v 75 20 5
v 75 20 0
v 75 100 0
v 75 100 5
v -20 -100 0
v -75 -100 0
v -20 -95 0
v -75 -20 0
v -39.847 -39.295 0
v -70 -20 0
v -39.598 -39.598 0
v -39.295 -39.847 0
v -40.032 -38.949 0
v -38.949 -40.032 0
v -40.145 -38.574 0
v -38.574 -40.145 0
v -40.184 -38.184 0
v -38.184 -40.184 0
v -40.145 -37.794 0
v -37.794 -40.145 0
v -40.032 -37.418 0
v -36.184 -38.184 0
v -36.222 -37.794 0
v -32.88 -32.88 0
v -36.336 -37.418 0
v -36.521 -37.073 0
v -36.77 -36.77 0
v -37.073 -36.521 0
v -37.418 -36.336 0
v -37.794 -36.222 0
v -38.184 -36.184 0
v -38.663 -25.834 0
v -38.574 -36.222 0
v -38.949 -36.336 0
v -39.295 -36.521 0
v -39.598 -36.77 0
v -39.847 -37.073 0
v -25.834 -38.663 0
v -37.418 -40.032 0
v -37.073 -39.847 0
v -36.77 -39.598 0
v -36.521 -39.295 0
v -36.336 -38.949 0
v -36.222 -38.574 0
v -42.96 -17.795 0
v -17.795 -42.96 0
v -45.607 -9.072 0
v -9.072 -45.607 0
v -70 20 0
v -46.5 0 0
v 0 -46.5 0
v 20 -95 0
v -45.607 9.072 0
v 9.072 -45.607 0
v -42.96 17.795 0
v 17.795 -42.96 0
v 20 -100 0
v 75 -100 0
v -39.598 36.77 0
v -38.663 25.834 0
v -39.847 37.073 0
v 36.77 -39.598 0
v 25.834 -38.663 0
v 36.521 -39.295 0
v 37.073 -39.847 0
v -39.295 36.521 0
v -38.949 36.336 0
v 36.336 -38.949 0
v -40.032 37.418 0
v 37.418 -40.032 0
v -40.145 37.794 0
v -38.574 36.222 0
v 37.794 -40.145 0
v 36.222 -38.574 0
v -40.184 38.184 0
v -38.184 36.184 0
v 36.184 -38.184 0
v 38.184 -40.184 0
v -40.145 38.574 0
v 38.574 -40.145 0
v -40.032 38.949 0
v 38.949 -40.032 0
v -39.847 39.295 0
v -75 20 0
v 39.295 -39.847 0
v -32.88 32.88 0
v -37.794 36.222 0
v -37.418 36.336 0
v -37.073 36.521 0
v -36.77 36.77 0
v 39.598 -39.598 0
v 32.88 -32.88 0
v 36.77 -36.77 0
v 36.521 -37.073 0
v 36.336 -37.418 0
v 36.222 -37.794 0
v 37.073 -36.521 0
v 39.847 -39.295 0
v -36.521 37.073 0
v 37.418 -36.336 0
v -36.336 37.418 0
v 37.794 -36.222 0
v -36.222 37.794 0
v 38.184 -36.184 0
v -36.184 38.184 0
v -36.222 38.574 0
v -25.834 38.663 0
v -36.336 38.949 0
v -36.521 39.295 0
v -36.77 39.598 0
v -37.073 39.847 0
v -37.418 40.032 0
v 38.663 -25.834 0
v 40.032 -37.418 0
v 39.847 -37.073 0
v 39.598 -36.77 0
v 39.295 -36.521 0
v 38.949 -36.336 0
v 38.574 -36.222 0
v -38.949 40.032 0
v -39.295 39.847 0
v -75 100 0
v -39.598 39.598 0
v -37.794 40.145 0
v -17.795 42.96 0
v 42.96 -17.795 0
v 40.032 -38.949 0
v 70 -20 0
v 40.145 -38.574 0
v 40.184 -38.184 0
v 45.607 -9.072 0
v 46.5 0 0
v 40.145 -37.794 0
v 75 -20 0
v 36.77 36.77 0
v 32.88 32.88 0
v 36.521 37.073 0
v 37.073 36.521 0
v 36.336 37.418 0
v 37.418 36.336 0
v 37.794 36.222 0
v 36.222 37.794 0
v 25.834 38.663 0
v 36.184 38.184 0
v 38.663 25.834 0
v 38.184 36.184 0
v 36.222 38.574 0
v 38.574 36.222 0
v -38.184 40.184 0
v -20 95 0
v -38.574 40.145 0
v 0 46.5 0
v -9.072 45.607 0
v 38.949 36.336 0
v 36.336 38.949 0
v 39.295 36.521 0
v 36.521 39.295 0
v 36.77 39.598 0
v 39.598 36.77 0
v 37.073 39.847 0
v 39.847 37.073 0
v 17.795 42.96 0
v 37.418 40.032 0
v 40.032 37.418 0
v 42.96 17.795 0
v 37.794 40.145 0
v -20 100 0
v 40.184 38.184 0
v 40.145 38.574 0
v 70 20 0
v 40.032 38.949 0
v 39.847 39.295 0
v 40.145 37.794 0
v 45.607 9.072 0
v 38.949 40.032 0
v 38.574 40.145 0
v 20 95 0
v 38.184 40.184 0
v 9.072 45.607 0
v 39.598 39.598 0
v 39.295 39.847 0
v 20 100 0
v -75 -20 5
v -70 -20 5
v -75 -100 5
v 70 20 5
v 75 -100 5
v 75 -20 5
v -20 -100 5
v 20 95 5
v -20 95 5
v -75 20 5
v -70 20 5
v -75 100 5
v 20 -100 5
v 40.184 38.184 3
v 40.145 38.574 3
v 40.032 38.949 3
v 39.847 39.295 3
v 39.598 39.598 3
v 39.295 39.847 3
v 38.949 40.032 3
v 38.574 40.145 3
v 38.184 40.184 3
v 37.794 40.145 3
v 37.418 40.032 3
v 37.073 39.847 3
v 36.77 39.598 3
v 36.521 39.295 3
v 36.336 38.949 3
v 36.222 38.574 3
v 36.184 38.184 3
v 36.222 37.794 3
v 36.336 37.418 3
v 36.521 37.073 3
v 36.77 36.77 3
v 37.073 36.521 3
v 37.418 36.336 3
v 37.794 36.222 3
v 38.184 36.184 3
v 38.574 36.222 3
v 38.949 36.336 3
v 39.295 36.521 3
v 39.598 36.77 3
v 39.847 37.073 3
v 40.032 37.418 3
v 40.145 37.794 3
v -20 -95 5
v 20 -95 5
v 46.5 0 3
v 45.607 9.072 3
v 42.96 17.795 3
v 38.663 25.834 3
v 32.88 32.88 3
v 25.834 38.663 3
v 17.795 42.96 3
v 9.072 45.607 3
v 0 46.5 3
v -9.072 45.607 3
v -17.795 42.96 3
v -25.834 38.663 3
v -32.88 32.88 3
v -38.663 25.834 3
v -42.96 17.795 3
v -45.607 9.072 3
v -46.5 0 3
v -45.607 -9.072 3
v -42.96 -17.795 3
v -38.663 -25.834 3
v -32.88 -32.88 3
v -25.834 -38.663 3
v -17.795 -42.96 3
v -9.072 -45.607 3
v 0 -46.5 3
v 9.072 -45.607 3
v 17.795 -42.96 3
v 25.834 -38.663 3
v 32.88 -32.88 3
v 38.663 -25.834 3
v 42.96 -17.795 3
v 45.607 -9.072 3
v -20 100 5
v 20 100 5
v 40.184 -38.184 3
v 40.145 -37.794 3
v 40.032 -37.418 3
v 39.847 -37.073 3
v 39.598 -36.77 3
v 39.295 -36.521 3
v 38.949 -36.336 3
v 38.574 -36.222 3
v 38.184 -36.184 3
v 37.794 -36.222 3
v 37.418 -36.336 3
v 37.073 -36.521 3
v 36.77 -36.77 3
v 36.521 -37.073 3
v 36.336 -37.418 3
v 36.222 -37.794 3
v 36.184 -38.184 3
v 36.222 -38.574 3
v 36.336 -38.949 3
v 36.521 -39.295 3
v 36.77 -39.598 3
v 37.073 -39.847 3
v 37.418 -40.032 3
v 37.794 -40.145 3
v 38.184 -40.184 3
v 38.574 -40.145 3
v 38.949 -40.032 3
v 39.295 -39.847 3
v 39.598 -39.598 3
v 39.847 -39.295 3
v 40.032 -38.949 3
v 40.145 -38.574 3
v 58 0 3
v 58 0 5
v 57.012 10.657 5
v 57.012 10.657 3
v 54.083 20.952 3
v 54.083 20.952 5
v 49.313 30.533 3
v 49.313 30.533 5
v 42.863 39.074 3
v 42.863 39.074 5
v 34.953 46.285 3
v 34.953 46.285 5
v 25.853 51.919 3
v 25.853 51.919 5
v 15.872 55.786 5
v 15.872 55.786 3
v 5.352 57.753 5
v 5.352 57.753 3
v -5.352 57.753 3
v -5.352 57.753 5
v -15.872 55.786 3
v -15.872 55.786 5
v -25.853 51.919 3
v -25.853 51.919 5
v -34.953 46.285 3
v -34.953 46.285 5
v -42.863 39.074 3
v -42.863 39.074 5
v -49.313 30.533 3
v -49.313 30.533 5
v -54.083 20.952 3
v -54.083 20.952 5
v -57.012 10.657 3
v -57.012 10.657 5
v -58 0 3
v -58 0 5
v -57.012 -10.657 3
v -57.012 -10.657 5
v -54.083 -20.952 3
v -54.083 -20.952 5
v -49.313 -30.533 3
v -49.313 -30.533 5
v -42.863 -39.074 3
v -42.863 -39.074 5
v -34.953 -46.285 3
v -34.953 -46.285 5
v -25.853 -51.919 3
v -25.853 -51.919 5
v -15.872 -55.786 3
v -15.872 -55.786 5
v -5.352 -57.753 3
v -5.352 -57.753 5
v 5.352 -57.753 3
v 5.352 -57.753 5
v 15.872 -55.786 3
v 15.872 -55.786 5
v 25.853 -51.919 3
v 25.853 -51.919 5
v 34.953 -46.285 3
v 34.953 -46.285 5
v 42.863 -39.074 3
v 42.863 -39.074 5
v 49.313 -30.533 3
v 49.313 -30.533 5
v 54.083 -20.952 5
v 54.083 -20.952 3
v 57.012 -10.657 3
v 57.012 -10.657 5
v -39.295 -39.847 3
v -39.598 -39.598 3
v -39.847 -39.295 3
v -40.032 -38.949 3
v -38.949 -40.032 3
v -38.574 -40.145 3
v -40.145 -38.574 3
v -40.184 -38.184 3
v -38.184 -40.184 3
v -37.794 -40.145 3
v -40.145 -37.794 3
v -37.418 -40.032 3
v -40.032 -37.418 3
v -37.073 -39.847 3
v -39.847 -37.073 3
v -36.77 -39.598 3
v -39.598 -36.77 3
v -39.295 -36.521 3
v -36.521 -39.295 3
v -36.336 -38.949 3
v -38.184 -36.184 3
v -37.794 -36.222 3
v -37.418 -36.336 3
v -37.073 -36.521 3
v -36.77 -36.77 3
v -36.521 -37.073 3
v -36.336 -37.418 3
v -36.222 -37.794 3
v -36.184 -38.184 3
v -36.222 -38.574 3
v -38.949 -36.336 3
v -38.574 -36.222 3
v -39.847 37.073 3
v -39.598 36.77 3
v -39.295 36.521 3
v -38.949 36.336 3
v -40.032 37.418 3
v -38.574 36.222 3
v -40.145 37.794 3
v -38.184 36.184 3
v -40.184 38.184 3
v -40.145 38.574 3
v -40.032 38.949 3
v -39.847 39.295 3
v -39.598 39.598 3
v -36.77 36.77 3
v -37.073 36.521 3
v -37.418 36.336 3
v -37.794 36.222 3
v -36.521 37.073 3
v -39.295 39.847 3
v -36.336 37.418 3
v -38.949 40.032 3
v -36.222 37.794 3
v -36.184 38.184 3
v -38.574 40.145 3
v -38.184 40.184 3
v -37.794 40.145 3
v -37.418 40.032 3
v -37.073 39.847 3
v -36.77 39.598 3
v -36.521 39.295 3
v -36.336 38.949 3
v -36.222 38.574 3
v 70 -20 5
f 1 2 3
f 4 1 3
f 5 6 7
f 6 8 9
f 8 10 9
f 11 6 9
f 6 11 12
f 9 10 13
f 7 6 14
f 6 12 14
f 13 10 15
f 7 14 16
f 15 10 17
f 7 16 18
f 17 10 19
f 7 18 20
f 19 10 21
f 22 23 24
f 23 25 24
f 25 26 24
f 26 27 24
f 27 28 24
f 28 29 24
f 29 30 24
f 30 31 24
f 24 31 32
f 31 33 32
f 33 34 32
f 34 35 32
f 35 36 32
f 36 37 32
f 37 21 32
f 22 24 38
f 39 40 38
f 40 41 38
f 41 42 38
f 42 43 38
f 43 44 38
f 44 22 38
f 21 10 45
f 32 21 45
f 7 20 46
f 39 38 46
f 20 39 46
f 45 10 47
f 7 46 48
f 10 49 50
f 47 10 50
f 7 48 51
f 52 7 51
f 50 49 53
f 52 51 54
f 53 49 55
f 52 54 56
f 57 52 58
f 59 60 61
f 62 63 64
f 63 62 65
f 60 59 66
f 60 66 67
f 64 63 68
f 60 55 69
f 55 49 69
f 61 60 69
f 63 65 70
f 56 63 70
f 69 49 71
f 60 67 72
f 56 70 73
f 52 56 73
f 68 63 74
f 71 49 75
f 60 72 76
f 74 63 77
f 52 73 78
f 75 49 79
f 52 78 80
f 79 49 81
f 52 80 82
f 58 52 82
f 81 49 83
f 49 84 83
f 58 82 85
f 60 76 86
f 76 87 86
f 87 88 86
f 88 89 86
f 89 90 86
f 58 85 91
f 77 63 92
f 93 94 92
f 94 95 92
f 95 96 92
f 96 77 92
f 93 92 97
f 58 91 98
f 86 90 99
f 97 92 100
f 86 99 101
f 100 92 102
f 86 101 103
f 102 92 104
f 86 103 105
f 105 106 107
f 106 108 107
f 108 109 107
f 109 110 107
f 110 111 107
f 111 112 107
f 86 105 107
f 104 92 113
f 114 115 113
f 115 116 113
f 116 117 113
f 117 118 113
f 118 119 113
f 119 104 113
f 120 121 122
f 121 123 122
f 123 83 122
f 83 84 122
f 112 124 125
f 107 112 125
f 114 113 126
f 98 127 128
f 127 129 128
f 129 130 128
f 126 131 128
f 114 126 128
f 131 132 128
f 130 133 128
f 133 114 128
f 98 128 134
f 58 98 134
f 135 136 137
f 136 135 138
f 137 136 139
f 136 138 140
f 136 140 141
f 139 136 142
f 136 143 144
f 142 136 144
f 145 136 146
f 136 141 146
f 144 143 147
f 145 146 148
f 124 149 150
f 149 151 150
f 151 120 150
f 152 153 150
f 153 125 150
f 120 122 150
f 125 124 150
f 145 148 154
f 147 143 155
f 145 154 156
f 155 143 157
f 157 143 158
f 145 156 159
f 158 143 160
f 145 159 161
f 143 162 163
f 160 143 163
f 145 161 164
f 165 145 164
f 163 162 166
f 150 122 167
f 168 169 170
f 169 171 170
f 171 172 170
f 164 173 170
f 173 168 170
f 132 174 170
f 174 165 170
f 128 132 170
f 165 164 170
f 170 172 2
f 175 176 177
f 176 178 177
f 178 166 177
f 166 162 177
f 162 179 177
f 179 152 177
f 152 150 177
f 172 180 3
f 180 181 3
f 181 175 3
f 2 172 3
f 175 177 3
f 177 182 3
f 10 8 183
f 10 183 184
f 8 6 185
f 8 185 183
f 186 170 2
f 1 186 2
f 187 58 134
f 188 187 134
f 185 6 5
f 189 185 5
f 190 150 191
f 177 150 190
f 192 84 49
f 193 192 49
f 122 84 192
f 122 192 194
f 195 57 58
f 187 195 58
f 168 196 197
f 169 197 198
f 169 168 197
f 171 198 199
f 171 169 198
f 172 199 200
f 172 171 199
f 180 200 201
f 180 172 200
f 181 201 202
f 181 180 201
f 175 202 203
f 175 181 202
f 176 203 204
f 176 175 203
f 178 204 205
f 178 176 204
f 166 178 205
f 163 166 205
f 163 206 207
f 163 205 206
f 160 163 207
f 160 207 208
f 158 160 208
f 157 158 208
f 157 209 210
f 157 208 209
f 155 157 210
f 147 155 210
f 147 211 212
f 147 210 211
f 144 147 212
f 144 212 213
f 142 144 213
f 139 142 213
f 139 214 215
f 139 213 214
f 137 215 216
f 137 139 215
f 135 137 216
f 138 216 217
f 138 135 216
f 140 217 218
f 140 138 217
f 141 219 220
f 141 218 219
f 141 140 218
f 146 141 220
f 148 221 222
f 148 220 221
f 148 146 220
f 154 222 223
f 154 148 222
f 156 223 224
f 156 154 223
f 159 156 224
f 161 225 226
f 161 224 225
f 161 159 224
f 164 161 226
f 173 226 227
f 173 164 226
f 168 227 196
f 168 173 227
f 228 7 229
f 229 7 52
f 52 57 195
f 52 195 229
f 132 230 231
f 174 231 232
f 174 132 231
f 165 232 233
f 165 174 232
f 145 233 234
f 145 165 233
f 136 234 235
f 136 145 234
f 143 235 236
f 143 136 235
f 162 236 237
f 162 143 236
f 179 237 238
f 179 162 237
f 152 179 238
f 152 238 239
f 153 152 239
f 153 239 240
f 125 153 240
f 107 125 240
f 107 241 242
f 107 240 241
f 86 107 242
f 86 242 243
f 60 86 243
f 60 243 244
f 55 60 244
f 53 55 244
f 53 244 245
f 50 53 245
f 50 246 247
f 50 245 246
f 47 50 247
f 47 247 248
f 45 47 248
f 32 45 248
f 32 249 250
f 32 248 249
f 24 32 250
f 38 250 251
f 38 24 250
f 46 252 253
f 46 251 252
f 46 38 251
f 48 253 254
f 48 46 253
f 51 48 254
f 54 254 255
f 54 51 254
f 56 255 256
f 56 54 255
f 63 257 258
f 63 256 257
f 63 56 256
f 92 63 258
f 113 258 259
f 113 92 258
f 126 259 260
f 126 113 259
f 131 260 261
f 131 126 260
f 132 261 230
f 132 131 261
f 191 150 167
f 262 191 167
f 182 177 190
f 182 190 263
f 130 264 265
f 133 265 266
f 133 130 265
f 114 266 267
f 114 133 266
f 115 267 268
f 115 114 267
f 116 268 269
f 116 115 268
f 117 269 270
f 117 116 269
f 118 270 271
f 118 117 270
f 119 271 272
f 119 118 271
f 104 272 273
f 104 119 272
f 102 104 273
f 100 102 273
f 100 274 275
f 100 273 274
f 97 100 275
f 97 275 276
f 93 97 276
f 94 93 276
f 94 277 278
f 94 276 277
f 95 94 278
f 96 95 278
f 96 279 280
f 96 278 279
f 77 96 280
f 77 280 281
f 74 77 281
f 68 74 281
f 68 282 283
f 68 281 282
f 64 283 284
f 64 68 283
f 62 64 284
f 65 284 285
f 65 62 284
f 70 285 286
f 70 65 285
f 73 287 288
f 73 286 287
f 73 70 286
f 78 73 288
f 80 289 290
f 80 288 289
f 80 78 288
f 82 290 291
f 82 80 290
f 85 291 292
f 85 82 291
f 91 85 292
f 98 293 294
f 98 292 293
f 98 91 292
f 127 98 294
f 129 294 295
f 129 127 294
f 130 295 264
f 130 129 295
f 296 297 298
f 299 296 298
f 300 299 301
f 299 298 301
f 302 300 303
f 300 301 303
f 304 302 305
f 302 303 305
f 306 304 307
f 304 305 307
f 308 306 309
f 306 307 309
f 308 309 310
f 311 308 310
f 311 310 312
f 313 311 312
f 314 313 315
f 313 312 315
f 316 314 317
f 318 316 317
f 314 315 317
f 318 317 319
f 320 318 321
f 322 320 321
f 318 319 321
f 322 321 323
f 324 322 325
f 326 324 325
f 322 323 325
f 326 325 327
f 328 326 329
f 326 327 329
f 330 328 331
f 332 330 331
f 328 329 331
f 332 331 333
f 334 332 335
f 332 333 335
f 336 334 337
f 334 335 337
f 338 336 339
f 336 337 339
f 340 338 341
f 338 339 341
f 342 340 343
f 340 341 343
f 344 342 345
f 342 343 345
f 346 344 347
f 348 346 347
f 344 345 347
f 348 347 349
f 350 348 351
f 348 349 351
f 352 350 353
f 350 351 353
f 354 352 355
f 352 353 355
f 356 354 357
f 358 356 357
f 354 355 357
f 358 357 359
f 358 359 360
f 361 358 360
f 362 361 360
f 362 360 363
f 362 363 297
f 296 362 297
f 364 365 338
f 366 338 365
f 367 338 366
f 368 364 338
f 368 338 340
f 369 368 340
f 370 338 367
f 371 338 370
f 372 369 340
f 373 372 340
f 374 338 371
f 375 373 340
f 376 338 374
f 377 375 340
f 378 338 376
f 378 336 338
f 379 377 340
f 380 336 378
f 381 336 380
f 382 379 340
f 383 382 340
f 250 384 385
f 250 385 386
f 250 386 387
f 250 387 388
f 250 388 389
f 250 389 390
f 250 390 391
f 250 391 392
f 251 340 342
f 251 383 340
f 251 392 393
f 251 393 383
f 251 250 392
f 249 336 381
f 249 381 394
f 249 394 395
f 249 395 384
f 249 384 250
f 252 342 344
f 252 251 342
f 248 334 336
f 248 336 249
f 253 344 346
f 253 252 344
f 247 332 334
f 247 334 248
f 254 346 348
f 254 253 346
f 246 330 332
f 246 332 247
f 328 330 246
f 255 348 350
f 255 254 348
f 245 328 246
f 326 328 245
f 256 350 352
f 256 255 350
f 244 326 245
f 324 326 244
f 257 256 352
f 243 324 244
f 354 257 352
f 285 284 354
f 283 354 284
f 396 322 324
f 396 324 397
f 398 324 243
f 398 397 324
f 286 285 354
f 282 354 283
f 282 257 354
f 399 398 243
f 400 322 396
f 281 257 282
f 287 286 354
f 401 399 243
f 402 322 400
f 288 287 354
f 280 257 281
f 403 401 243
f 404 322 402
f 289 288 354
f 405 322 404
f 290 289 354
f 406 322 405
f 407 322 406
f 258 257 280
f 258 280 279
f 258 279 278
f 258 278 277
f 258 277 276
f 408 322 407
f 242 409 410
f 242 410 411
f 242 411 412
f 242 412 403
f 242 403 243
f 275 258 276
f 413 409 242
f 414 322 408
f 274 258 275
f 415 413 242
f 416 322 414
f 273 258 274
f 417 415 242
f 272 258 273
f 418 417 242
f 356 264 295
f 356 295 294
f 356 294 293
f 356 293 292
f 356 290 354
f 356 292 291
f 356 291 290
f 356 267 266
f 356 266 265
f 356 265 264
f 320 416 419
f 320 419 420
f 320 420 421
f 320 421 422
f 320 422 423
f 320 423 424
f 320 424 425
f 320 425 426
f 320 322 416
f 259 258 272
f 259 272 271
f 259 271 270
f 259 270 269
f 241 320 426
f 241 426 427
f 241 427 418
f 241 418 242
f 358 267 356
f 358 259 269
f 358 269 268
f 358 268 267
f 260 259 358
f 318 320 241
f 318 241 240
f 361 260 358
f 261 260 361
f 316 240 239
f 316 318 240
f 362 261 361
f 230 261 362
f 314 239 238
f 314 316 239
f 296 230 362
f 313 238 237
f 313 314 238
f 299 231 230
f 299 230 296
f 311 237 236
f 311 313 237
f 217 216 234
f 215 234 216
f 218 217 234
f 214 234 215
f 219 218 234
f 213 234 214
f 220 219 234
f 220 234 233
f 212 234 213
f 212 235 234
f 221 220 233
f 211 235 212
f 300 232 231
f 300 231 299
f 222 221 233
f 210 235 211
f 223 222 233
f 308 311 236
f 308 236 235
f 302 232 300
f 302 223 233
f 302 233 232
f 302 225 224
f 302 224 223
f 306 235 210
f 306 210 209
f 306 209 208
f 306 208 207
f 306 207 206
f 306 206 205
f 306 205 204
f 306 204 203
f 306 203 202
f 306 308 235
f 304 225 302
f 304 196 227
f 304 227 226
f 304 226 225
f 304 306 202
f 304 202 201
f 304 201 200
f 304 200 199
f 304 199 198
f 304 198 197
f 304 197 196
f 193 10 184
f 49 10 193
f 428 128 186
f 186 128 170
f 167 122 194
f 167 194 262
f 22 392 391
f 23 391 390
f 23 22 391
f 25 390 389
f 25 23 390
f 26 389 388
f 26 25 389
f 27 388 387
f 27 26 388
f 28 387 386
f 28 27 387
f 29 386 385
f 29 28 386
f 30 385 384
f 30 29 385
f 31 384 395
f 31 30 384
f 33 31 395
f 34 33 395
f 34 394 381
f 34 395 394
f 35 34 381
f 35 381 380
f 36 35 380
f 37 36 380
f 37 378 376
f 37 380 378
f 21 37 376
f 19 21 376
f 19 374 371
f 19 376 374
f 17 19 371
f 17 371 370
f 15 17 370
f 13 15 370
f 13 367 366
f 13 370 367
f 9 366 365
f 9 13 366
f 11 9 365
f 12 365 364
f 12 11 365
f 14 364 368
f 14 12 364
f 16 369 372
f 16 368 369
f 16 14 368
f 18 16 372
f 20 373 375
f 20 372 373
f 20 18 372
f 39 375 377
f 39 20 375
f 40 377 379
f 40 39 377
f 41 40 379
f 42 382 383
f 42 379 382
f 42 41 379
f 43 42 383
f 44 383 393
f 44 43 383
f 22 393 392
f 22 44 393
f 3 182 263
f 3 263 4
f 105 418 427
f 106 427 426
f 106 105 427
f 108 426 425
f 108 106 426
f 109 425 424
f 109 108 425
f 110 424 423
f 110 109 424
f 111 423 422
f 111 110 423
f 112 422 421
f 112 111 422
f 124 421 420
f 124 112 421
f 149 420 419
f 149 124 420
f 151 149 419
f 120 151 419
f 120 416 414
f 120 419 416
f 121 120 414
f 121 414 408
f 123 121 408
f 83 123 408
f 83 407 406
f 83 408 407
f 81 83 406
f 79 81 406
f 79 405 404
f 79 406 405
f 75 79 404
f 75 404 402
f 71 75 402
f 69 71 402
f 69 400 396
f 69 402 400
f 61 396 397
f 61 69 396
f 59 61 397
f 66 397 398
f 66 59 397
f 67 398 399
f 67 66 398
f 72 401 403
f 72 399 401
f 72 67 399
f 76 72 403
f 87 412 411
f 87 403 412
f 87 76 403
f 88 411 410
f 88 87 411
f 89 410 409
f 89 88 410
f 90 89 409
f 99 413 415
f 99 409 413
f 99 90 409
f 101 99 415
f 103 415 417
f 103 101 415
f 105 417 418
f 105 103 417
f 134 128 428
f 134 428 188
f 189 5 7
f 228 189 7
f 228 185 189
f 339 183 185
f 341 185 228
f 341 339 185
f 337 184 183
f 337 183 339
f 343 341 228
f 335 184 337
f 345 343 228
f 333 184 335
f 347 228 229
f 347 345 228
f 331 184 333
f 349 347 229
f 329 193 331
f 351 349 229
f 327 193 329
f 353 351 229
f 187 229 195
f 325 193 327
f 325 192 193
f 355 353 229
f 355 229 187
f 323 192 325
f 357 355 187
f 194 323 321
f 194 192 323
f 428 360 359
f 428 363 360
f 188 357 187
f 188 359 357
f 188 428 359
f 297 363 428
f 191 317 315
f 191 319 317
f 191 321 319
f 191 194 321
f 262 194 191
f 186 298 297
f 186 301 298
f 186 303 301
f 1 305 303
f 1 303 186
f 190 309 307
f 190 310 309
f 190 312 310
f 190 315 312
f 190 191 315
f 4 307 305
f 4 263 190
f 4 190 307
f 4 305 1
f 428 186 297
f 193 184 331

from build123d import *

# Parameters (mm, degrees)
CROQUIS1_W              = 150
CROQUIS1_H              = 200
CROQUIS1_R              = 46.5
CROQUIS1_R_2            = 2
SALIENTE_EXTRUIR1_DEPTH = 5
CROQUIS2_R              = 58
CORTAR_EXTRUIR1_DEPTH   = 2
CORTAR_EXTRUIR2_START   = -5
CROQUIS3_W              = 40
CROQUIS3_H              = 5
CROQUIS3_W_2            = 5
CROQUIS3_H_2            = 40
CORTAR_EXTRUIR2_DEPTH   = 5


with BuildPart() as part:
    # Croquis1 → Saliente-Extruir1 (new body)
    with BuildSketch(Plane.XY):
        Rectangle(CROQUIS1_W, CROQUIS1_H)
        Circle(CROQUIS1_R, mode=Mode.SUBTRACT)
        with Locations((-38.183766184, 38.183766184)):
            Circle(CROQUIS1_R_2, mode=Mode.SUBTRACT)
        with Locations((38.183766184, 38.183766184)):
            Circle(CROQUIS1_R_2, mode=Mode.SUBTRACT)
        with Locations((38.183766184, -38.183766184)):
            Circle(CROQUIS1_R_2, mode=Mode.SUBTRACT)
        with Locations((-38.183766184, -38.183766184)):
            Circle(CROQUIS1_R_2, mode=Mode.SUBTRACT)
    extrude(amount=SALIENTE_EXTRUIR1_DEPTH)

    # Croquis2 → Cortar-Extruir1 (cut)
    with BuildSketch(Plane.XY.offset(5)):
        Circle(CROQUIS2_R)
    extrude(amount=-CORTAR_EXTRUIR1_DEPTH, mode=Mode.SUBTRACT)

    # Croquis3 → Cortar-Extruir2 (cut)
    with BuildSketch(Plane.XY.offset(5).offset(CORTAR_EXTRUIR2_START)):
        with Locations((0, 97.5)):
            Rectangle(CROQUIS3_W, CROQUIS3_H)
        with Locations((0, -97.5)):
            Rectangle(CROQUIS3_W, CROQUIS3_H)
        with Locations((-72.5, 0)):
            Rectangle(CROQUIS3_W_2, CROQUIS3_H_2)
        with Locations((72.5, 0)):
            Rectangle(CROQUIS3_W_2, CROQUIS3_H_2)
    extrude(amount=CORTAR_EXTRUIR2_DEPTH, mode=Mode.SUBTRACT)


solid = part.part
